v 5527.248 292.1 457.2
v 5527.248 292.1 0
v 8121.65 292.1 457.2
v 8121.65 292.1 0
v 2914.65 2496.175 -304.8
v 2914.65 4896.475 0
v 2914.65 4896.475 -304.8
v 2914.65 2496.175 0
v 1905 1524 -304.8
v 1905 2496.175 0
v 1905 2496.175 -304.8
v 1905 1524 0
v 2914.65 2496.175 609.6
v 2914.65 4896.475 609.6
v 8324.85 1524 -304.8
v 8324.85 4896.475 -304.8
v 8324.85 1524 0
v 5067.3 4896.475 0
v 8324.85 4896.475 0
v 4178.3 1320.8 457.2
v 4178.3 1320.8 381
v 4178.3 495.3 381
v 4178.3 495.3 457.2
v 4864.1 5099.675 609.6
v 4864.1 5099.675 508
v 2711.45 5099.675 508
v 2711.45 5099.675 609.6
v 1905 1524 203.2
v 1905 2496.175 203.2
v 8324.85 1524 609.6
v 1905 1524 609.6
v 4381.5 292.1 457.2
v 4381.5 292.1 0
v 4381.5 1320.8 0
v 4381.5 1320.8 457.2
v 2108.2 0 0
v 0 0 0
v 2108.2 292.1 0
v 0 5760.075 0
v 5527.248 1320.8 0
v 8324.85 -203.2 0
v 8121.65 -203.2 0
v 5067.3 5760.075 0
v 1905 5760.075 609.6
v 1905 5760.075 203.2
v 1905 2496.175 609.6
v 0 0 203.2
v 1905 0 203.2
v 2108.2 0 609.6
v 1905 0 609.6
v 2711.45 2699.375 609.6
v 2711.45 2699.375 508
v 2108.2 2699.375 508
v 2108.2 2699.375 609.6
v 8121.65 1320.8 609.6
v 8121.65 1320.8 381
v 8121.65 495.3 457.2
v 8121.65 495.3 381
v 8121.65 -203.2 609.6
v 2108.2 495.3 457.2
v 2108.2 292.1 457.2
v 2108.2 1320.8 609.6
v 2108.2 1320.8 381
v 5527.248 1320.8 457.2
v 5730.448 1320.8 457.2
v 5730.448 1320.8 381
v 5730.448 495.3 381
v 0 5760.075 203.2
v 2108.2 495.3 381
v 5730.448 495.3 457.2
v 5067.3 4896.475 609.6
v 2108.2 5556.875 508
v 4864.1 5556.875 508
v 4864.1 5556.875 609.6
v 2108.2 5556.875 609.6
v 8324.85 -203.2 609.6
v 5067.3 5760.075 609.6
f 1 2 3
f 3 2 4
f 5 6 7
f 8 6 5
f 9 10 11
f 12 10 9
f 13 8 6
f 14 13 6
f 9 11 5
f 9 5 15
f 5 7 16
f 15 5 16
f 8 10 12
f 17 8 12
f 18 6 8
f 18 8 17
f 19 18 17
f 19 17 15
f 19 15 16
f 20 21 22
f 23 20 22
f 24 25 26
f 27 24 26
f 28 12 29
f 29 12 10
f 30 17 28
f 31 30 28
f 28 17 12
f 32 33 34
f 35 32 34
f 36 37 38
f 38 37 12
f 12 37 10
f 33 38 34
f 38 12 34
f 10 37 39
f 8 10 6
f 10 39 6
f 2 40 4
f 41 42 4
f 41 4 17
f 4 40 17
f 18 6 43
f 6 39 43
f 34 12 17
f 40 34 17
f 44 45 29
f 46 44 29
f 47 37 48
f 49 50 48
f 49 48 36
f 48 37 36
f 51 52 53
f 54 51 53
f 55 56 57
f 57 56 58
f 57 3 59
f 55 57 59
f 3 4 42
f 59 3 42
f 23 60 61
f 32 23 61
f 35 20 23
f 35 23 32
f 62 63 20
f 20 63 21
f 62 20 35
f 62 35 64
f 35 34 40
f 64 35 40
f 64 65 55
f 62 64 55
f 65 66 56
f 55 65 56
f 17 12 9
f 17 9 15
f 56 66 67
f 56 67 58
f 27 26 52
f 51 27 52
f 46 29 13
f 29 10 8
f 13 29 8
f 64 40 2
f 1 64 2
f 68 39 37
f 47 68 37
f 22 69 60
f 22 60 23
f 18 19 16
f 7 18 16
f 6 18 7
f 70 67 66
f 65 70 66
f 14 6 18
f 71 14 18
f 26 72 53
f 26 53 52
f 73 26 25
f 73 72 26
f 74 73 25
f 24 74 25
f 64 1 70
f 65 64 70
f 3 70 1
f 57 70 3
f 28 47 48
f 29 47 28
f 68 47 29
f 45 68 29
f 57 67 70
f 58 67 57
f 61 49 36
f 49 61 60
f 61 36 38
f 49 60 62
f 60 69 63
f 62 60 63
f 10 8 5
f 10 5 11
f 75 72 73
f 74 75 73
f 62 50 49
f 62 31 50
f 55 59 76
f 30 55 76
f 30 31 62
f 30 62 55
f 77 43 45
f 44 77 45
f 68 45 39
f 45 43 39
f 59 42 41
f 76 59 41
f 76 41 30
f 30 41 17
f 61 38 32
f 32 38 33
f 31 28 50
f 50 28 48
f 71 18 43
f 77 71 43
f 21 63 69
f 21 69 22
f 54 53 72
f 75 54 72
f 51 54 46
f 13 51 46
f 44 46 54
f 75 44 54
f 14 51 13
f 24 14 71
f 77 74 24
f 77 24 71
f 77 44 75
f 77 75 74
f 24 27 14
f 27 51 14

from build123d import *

# Parameters (mm, degrees)
F1_DEPTH = 203.2
F0_W     = 1949.45
F0_H     = 203.2
F2_DEPTH = 609.6
F0_W_2   = 2070.1
F0_W_3   = 2391.2020942688
F3_DEPTH = 457.2
F0_W_4   = 3257.55
F0_H_2   = 3372.4745738983
F4_DEPTH = 304.8
F5_DEPTH = 508
F0_H_3   = 825.5
F6_DEPTH = 381


with BuildPart() as f1:
    # F0 (on Top) → F1 (new body)
    with BuildSketch(Plane.XY):
        Polygon((0, 5760.0745738983), (0, 0), (1905, 0), (1905, 1320.8), (1905, 1524), (1905, 2496.1745738983), (1905, 2699.3745738983), (1905, 5760.0745738983), align=None)
    extrude(amount=F1_DEPTH)

    # F0 (on Top) → F2 (join)
    with BuildSketch(Plane.XY):
        Polygon((2108.2, 5760.0745738983), (1905, 5760.0745738983), (1905, 2699.3745738983), (2108.2, 2699.3745738983), (2108.2, 5556.8745738983), align=None)
        Polygon((5067.3, 5760.0745738983), (2108.2, 5760.0745738983), (2108.2, 5556.8745738983), (4864.1, 5556.8745738983), (5067.3, 5556.8745738983), align=None)
        Polygon((2711.45, 5099.6745738983), (2711.45, 2699.3745738983), (2914.65, 2699.3745738983), (2914.65, 4896.4745738983), (2914.65, 5099.6745738983), align=None)
        with Locations((3889.375, 4998.0745738983)):
            Rectangle(F0_W, F0_H)
        Polygon((4864.1, 4896.4745738983), (5067.3, 4896.4745738983), (5067.3, 5556.8745738983), (4864.1, 5556.8745738983), (4864.1, 5099.6745738983), align=None)
        Polygon((2108.2, 2699.3745738983), (1905, 2699.3745738983), (1905, 2496.1745738983), (2914.65, 2496.1745738983), (2914.65, 2699.3745738983), (2711.45, 2699.3745738983), align=None)
        Polygon((1905, 1320.8), (1905, 0), (2108.2, 0), (2108.2, 292.1), (2108.2, 495.3), (2108.2, 1320.8), align=None)
        Polygon((1905, 1524), (1905, 1320.8), (2108.2, 1320.8), (4178.3, 1320.8), (4381.5, 1320.8), (5527.2479057312, 1320.8), (5730.4479057312, 1320.8), (8121.65, 1320.8), (8324.85, 1320.8), (8324.85, 1524), (5067.3, 1524), align=None)
        Polygon((8324.85, -203.2), (8324.85, 1320.8), (8121.65, 1320.8), (8121.65, 495.3), (8121.65, 292.1), (8121.65, -203.2), align=None)
    extrude(amount=F2_DEPTH)

    # F0 (on Top) → F3 (join)
    with BuildSketch(Plane.XY):
        Polygon((4381.5, 1320.8), (4178.3, 1320.8), (4178.3, 495.3), (4178.3, 292.1), (4381.5, 292.1), align=None)
        with Locations((3143.25, 393.7)):
            Rectangle(F0_W_2, F0_H)
        Polygon((5730.4479057312, 1320.8), (5527.2479057312, 1320.8), (5527.2479057312, 292.1), (5730.4479057312, 292.1), (5730.4479057312, 495.3), align=None)
        with Locations((6926.0489528656, 393.7)):
            Rectangle(F0_W_3, F0_H)
    extrude(amount=F3_DEPTH)

    # F0 (on Top) → F4 (join)
    with BuildSketch(Plane.XY):
        Polygon((1905, 2496.1745738983), (1905, 1524), (5067.3, 1524), (5067.3, 4896.4745738983), (4864.1, 4896.4745738983), (2914.65, 4896.4745738983), (2914.65, 2699.3745738983), (2914.65, 2496.1745738983), align=None)
        with Locations((6696.075, 3210.2372869492)):
            Rectangle(F0_W_4, F0_H_2)
    extrude(amount=-F4_DEPTH)

    # F0 (on Top) → F5 (join)
    with BuildSketch(Plane.XY):
        Polygon((2108.2, 5556.8745738983), (2108.2, 2699.3745738983), (2711.45, 2699.3745738983), (2711.45, 5099.6745738983), (2914.65, 5099.6745738983), (4864.1, 5099.6745738983), (4864.1, 5556.8745738983), align=None)
    extrude(amount=F5_DEPTH)

    # F0 (on Top) → F6 (join)
    with BuildSketch(Plane.XY):
        with Locations((3143.25, 908.05)):
            Rectangle(F0_W_2, F0_H_3)
        with Locations((6926.0489528656, 908.05)):
            Rectangle(F0_W_3, F0_H_3)
    extrude(amount=F6_DEPTH)


solid = f1.part
